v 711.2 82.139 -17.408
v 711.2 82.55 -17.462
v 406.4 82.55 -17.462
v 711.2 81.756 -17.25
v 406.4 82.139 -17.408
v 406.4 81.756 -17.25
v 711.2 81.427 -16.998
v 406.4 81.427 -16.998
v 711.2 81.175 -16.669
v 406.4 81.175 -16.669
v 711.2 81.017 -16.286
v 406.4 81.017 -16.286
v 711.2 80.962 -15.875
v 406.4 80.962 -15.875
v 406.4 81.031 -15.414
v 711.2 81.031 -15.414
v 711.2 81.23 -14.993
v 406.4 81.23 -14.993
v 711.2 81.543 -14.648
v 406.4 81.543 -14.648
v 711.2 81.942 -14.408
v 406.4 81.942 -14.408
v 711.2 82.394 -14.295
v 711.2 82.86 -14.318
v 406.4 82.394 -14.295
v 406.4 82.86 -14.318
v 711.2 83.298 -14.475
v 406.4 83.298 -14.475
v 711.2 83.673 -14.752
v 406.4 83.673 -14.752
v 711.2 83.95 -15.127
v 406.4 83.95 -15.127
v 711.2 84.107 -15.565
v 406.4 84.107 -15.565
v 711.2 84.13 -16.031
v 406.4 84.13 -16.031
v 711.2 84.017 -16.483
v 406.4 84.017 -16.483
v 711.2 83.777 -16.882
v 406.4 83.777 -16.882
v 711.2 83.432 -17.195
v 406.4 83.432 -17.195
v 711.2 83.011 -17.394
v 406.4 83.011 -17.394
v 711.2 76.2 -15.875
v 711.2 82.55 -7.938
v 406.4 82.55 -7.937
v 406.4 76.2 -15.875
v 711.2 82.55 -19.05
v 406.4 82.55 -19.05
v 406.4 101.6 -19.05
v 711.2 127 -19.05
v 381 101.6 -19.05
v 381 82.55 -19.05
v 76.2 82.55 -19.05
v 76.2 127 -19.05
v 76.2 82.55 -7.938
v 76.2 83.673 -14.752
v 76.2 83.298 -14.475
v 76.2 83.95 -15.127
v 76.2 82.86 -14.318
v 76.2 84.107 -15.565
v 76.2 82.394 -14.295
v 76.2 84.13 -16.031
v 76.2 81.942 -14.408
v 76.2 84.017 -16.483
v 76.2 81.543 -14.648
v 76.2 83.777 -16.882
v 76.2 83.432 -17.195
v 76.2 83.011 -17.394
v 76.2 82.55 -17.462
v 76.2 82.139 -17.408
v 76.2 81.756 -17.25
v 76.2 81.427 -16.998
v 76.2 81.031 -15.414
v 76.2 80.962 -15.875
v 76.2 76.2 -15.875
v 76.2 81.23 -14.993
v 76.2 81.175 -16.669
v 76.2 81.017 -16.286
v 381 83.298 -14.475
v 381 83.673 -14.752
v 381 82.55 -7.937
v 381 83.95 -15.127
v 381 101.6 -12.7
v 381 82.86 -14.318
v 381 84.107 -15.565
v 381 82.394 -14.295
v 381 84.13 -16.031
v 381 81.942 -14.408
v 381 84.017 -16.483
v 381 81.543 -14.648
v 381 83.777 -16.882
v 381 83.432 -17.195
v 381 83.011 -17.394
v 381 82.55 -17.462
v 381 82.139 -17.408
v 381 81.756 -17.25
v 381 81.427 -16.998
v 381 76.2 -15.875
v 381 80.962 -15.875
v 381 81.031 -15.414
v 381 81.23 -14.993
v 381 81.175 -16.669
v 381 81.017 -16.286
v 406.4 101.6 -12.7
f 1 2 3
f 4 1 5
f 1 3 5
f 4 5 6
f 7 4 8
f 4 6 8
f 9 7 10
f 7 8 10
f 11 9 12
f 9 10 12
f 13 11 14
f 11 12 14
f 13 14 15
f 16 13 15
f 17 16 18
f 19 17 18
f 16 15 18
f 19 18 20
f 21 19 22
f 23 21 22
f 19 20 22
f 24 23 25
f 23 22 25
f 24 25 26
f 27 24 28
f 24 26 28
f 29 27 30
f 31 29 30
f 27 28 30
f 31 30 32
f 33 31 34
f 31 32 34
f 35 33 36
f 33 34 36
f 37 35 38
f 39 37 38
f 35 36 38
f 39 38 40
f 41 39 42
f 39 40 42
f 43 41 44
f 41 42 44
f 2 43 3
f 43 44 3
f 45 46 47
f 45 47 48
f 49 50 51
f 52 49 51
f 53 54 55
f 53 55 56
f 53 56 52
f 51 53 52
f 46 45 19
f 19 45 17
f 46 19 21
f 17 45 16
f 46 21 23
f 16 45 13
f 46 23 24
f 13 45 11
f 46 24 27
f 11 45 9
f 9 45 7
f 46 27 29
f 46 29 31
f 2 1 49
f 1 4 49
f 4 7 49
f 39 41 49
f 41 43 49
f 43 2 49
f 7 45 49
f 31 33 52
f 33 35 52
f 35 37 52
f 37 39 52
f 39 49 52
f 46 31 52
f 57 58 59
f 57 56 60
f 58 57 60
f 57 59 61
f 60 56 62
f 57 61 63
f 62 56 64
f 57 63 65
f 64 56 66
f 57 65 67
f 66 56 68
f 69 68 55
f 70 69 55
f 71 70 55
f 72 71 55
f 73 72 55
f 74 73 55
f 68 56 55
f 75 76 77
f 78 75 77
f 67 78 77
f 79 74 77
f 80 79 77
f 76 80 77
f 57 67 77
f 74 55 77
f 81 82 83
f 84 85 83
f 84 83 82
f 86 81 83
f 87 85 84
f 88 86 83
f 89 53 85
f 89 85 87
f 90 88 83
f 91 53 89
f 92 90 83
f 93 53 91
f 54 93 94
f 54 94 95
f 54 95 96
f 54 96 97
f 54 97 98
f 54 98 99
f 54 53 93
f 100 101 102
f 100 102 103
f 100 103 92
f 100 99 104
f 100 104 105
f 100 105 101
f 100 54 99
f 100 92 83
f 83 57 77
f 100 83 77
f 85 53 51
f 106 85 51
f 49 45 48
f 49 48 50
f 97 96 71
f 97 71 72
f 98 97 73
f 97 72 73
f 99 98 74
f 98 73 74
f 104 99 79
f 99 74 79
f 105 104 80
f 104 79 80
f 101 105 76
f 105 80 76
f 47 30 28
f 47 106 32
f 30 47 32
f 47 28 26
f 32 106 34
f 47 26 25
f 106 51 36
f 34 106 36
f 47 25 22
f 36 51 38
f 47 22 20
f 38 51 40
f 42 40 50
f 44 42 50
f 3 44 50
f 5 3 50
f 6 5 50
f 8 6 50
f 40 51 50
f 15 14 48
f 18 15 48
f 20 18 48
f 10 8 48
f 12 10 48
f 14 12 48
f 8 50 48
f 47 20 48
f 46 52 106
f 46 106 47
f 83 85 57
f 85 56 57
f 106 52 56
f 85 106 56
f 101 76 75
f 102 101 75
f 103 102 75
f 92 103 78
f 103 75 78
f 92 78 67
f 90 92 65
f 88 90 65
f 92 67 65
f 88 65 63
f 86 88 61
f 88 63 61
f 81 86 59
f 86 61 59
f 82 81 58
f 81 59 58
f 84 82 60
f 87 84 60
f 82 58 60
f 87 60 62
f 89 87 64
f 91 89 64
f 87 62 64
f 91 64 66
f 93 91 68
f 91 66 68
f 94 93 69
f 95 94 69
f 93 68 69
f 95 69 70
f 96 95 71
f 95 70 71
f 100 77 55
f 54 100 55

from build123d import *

# Parameters (mm, degrees)
F1_DEPTH   = 762
F2_W       = 12.7
F2_H       = 25.4
F1_FACE1_W = 762
F1_FACE1_H = 7.0995158286
F3_DEPTH   = 38.101
F5_DEPTH   = 635.001
F7_DEPTH   = 635.001


# Not quite as in the source:
# - a feature names something its author has since deleted; it is built from what else it names


with BuildPart() as f1:
    # F0 (on Right) → F1 (new body)
    with BuildSketch(Plane.YZ):
        Polygon((-76.2, 6.35), (-127, -15.875), (-120.65, -19.05), (127, -19.05), (-25.4, 19.05), align=None)
    extrude(amount=F1_DEPTH)

    # F2 (on face) + F1_face1 (on face) → F3 (cut, through all)
    with BuildSketch(Plane(origin=(0, 0, -19.05), x_dir=(1, 0, 0), z_dir=(0, 0, -1))):
        Polygon((0, 120.65), (0, -127), (76.2, -127), (76.2, -76.2), (381, -76.2), (393.7, -76.2), (406.4, -76.2), (711.2, -76.2), (711.2, -127), (762, -127), (762, 120.65), align=None)
        with Locations((387.35, -88.9)):
            Rectangle(F2_W, F2_H)
        with Locations((400.05, -88.9)):
            Rectangle(F2_W, F2_H)
    with BuildSketch(Plane(origin=(381, -123.825, -17.4625), x_dir=(1, 0, 0), z_dir=(0, -0.4472135955, -0.894427191))):
        Rectangle(F1_FACE1_W, F1_FACE1_H)
    extrude(amount=-F3_DEPTH, dir=(0, 0, -1), mode=Mode.SUBTRACT)

    # F4 (on face) → F5 (cut, through all)
    with BuildSketch(Plane(origin=(76.2, 0, 0), x_dir=(0, -1, 0), z_dir=(-1, 0, 0))):
        Polygon((-76.2, -6.35), (-82.55, -7.9375), (-76.2, -15.875), align=None)
        Polygon((-76.2, -15.875), (-82.55, -19.05), (-76.2, -19.05), align=None)
    extrude(amount=-F5_DEPTH, mode=Mode.SUBTRACT)

    # F6 (on face) → F7 (cut, through all)
    with BuildSketch(Plane(origin=(76.2, 0, 0), x_dir=(0, -1, 0), z_dir=(-1, 0, 0))):
        with BuildLine():
            ThreePointArc((-82.55, -17.4625), (-81.4274679849, -16.9975320151), (-80.9625, -15.875))
            ThreePointArc((-80.9625, -15.875), (-83.6725320151, -14.7524679849), (-82.55, -17.4625))
        make_face()
    extrude(amount=-F7_DEPTH, mode=Mode.SUBTRACT)


solid = f1.part
